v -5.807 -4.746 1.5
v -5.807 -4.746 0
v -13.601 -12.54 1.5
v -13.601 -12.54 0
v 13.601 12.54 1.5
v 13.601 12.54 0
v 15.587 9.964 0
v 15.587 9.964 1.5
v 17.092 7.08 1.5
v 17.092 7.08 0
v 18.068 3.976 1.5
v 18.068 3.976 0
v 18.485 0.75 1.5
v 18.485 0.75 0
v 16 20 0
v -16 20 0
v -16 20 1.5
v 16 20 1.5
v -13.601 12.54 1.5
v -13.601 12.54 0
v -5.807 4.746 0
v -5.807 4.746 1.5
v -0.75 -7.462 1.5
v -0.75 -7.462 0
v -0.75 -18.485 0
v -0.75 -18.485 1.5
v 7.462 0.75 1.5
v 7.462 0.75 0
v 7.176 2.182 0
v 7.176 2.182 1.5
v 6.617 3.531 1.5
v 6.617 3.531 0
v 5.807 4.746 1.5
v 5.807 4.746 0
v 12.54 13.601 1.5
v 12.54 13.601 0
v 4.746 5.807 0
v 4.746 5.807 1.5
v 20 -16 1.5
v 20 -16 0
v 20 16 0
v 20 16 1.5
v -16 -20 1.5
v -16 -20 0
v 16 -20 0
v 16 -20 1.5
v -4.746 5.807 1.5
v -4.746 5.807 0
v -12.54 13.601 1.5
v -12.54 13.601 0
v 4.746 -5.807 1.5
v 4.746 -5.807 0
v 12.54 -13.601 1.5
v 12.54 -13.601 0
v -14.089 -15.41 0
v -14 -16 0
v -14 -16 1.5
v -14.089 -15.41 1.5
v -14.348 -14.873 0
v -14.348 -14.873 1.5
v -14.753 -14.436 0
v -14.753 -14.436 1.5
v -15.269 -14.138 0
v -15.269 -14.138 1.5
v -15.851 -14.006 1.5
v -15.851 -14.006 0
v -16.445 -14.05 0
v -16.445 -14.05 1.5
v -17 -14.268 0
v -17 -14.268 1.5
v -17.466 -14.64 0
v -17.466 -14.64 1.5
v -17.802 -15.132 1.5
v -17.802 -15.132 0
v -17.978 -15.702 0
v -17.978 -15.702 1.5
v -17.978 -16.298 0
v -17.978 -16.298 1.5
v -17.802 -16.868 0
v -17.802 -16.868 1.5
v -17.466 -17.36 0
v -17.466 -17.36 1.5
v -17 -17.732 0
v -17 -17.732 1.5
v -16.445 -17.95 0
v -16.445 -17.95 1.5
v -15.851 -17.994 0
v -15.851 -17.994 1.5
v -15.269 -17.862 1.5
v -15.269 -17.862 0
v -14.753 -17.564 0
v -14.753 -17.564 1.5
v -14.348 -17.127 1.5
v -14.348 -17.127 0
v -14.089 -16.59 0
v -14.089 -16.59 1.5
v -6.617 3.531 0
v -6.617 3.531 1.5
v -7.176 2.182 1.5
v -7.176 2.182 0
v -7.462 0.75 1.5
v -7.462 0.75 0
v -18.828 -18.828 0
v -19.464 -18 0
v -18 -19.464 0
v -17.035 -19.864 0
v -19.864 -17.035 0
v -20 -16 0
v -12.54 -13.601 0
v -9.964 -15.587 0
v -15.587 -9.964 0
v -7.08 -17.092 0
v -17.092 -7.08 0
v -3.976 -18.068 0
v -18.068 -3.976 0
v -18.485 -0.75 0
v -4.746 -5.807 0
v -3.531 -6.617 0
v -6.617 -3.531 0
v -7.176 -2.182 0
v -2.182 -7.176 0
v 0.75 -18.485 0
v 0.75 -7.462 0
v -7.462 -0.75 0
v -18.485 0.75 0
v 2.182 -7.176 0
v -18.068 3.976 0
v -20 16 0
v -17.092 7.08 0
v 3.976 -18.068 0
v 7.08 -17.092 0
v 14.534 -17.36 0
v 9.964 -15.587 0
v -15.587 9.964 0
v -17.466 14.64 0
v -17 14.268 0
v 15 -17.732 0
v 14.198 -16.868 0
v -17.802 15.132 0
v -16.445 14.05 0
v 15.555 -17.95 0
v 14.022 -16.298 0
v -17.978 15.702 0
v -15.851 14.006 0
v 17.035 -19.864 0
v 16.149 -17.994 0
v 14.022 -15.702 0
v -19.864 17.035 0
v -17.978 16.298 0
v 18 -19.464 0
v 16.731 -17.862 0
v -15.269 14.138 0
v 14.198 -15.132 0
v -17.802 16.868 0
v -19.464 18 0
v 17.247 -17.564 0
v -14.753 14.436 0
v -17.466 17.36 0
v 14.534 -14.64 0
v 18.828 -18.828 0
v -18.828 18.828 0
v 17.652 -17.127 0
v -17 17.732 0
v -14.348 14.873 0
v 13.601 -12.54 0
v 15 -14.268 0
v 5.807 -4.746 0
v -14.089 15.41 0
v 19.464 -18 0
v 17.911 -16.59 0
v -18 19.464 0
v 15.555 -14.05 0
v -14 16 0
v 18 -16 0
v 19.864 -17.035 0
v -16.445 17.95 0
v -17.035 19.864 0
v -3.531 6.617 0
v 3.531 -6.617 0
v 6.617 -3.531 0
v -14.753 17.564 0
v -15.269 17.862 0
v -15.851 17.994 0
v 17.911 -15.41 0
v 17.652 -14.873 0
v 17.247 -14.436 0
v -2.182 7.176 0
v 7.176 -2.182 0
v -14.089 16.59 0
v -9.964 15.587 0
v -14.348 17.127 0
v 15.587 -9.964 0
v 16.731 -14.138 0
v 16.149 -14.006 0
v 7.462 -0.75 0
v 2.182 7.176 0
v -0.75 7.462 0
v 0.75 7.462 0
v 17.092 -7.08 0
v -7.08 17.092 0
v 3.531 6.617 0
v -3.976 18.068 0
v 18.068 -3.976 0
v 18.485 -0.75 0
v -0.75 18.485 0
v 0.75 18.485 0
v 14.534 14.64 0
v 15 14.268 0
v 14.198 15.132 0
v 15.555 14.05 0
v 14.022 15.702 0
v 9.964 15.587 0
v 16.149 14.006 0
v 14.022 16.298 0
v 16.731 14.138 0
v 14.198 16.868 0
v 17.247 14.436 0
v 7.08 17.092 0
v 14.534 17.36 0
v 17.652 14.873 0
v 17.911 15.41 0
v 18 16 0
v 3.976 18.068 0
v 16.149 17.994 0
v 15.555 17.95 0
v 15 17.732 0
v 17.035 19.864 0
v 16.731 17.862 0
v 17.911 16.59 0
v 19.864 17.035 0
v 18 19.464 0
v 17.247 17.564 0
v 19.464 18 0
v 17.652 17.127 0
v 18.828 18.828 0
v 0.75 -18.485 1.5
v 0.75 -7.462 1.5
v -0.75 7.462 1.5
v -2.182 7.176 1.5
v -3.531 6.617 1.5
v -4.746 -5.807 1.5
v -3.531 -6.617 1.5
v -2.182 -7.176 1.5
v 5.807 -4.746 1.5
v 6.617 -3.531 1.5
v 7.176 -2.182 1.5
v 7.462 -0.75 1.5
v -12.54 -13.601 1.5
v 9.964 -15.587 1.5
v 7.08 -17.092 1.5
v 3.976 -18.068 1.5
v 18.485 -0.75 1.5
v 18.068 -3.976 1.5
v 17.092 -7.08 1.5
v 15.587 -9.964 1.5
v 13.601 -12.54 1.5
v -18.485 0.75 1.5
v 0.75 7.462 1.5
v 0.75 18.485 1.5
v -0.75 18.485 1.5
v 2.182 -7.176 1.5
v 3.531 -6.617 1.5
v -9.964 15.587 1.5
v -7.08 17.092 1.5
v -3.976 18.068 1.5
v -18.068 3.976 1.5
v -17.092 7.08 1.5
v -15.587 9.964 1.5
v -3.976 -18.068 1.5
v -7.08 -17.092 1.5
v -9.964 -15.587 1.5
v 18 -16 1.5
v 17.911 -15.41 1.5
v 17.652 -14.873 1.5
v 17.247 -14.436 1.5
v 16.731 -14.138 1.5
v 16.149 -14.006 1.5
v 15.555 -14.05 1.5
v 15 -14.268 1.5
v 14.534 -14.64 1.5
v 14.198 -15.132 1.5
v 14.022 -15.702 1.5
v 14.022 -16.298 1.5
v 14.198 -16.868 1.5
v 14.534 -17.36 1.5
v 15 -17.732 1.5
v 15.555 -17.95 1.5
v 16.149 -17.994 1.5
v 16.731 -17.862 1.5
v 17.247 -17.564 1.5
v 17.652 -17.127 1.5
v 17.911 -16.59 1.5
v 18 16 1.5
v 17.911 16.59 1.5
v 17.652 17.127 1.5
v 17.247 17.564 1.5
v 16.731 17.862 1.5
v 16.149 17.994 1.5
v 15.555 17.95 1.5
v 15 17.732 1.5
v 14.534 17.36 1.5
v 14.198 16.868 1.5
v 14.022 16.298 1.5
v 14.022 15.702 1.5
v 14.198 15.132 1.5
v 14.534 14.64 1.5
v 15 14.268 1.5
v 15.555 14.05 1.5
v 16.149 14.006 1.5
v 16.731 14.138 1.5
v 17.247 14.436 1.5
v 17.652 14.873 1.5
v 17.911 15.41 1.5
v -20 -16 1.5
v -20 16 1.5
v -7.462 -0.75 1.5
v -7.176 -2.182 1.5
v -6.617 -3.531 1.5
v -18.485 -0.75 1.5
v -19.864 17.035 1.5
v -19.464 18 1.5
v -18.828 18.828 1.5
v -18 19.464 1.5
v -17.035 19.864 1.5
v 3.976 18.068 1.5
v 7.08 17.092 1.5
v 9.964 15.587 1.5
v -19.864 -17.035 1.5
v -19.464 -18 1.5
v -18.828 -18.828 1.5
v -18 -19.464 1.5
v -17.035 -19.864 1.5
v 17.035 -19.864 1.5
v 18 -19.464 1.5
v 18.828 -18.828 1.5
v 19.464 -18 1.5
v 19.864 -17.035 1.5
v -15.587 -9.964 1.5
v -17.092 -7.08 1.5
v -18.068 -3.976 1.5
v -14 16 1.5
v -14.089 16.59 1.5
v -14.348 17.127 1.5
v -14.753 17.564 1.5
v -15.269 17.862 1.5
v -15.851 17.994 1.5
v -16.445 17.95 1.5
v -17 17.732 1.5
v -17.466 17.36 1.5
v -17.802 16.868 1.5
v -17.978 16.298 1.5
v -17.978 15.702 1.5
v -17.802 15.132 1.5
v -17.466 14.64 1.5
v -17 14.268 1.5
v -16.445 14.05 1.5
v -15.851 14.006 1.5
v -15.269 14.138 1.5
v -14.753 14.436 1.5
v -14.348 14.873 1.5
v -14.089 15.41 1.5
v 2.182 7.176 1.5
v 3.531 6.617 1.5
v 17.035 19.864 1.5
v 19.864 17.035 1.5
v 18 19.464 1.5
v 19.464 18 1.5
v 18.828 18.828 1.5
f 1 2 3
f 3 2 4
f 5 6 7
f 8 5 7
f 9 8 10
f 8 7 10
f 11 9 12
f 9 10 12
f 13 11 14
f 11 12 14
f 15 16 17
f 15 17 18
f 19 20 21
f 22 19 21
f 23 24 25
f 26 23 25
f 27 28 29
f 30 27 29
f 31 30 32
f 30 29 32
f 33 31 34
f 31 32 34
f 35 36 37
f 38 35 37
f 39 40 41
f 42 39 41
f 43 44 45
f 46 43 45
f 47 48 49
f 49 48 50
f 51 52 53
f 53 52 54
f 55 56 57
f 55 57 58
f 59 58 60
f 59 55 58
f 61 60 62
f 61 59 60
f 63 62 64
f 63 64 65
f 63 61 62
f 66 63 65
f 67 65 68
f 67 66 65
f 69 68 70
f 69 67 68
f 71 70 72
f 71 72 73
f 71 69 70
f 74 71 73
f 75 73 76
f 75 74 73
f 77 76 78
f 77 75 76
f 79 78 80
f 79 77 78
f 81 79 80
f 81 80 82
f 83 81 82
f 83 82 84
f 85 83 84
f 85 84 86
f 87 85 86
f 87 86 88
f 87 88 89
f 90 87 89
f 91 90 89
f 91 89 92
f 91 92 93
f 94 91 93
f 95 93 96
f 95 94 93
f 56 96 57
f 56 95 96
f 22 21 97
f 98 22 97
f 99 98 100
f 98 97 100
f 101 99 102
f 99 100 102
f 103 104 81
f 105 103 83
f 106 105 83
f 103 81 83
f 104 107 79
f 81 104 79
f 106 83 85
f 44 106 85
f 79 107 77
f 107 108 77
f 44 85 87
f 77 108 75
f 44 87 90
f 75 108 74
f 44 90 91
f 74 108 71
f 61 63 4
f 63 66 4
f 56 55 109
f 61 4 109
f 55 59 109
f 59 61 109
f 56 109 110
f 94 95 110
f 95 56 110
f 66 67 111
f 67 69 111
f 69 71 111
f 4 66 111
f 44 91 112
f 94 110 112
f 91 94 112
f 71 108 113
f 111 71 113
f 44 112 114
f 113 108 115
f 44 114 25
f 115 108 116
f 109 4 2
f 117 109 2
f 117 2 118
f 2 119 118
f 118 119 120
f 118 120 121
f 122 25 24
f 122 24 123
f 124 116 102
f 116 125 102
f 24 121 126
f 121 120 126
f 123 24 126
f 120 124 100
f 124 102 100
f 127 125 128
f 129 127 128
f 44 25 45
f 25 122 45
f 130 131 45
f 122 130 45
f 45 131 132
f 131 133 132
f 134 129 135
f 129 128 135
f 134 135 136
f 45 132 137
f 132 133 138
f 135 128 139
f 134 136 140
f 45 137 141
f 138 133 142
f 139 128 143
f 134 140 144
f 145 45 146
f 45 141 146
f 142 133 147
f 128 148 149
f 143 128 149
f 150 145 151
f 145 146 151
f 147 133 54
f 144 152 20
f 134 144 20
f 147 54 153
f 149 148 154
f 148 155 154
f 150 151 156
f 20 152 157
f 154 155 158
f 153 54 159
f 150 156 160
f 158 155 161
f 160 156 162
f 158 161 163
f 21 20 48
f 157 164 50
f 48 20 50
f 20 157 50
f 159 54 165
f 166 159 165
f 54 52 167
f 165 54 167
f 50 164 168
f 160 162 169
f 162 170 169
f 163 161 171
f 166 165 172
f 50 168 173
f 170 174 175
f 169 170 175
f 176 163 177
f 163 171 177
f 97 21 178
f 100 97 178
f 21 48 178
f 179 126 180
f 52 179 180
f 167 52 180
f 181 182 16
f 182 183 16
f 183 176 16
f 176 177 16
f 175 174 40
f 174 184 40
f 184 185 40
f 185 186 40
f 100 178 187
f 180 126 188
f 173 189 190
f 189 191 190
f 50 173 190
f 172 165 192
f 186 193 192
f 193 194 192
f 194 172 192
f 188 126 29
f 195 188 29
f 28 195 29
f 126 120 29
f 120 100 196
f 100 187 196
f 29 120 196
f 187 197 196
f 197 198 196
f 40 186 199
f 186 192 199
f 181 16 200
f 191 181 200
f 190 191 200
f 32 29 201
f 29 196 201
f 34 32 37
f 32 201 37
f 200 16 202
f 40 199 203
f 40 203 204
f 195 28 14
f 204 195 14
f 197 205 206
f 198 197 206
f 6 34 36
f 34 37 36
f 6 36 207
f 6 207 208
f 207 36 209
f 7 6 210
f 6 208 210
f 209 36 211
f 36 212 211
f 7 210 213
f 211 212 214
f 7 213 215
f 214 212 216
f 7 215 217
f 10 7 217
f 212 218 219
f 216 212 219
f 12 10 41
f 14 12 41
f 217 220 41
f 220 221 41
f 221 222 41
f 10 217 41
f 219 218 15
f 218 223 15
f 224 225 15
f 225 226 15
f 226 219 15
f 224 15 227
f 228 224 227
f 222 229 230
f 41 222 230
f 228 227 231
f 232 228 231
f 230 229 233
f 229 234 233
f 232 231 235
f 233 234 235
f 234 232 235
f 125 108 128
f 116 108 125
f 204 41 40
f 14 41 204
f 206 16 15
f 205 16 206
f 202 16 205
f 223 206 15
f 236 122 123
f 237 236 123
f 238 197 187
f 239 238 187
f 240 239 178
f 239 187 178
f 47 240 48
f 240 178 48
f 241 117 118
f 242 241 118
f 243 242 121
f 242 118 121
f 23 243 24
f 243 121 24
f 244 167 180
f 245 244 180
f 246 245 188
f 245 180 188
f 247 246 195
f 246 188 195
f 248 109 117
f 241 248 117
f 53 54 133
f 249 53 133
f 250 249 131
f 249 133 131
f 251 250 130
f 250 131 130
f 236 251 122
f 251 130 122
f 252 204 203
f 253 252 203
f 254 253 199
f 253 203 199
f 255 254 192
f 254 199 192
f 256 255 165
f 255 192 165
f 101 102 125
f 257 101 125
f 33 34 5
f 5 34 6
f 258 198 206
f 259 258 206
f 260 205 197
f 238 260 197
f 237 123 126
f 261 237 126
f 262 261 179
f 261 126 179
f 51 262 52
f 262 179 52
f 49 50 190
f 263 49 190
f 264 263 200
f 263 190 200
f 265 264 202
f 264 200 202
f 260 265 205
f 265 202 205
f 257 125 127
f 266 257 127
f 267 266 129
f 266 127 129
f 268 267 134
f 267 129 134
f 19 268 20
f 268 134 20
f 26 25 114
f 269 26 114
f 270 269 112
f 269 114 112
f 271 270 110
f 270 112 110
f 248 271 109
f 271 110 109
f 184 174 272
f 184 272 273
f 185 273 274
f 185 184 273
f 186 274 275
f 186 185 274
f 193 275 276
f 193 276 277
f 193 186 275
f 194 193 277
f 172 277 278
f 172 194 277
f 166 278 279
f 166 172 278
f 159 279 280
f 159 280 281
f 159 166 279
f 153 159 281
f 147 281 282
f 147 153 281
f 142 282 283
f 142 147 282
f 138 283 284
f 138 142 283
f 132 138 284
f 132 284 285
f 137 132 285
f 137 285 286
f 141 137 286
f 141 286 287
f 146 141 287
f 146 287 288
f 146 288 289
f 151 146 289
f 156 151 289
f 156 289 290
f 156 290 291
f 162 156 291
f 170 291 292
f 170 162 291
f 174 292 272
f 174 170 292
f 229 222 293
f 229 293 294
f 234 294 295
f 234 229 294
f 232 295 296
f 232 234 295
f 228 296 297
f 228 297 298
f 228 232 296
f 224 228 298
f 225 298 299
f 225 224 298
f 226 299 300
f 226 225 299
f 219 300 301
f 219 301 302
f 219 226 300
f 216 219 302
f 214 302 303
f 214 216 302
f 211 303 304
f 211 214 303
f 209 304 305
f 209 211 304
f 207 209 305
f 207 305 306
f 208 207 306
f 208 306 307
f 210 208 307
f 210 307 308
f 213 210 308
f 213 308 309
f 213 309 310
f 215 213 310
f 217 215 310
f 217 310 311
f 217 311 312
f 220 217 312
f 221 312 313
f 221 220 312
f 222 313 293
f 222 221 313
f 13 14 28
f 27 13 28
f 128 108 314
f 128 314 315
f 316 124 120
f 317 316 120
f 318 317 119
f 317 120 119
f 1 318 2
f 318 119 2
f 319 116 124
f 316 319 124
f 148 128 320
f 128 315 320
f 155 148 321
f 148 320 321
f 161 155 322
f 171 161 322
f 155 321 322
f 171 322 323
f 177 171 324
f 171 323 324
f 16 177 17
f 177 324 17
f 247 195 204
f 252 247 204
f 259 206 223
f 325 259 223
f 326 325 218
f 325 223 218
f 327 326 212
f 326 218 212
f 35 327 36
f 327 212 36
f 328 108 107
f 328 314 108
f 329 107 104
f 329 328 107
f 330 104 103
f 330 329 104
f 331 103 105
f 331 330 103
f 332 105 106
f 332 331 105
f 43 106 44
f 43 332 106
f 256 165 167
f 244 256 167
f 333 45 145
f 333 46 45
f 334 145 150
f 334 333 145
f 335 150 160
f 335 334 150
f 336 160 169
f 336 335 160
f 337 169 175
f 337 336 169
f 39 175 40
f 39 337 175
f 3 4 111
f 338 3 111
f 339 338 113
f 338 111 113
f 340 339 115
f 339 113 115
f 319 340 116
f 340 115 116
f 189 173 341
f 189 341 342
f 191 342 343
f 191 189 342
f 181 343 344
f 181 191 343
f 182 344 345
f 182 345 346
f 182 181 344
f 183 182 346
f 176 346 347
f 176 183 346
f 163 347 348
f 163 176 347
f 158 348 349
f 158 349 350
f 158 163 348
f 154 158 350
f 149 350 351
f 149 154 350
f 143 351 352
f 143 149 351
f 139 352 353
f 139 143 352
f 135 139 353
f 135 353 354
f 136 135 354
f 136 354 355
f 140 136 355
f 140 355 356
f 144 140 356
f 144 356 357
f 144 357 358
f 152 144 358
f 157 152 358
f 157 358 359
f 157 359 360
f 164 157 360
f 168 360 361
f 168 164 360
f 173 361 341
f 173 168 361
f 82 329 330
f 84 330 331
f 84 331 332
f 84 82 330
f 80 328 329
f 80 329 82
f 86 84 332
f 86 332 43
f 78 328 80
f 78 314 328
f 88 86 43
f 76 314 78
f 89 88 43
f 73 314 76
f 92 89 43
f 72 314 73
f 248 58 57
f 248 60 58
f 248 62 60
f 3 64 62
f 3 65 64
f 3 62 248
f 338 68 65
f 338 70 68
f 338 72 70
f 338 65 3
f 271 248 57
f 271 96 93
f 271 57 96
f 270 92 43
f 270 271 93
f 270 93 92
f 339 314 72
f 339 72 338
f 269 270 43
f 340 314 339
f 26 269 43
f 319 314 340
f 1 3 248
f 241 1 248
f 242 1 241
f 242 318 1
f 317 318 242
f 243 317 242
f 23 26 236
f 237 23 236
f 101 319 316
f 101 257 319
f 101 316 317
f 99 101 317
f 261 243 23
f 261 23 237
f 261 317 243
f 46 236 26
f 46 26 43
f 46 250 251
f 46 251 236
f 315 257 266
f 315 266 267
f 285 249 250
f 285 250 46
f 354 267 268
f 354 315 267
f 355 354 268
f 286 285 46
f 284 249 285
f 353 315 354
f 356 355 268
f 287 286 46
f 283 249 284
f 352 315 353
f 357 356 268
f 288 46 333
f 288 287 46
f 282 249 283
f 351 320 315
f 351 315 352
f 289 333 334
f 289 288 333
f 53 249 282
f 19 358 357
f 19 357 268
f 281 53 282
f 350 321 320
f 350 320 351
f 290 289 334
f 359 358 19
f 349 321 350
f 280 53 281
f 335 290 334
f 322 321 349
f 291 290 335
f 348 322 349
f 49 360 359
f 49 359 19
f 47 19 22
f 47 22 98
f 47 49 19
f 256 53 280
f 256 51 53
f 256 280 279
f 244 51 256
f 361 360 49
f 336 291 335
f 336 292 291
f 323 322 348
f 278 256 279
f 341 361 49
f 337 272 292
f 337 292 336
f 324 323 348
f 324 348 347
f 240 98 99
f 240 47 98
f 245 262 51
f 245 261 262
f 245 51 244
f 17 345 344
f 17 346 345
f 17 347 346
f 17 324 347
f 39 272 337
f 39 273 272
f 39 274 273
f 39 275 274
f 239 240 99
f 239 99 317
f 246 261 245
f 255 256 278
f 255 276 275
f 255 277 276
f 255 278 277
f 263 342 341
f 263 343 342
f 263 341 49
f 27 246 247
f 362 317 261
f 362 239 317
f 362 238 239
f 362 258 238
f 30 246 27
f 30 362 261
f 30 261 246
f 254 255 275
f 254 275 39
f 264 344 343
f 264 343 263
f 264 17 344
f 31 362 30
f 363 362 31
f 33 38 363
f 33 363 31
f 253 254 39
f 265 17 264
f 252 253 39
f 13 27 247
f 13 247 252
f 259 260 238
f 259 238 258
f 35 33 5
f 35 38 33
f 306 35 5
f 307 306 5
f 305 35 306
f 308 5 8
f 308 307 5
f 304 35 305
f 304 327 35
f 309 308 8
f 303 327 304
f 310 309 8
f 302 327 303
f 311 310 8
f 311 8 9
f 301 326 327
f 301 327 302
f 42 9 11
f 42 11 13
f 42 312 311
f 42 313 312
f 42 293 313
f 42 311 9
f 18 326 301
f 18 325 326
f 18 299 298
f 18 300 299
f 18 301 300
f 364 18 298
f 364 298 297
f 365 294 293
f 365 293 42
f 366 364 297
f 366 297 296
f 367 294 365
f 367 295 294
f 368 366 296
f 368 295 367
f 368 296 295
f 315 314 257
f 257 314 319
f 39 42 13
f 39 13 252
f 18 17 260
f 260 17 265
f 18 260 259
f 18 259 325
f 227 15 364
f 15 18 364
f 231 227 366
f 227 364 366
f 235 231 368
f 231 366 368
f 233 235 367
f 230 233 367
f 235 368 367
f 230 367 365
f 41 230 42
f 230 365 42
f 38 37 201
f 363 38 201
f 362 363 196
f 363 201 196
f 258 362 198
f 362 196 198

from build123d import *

# Parameters (mm, degrees)
F0_W     = 40
F0_H     = 40
F0_R     = 2
F1_DEPTH = 1.5
F2_W     = 40
F2_H     = 40
F3_DEPTH = 25
F4_R     = 4


with BuildPart() as f1:
    # F0 (on Top) → F1 (new body)
    with BuildSketch(Plane.XY):
        Rectangle(F0_W, F0_H)
        with Locations((-16, -16)):
            Circle(F0_R, mode=Mode.SUBTRACT)
        with Locations((16, -16)):
            Circle(F0_R, mode=Mode.SUBTRACT)
        with Locations((-16, 16)):
            Circle(F0_R, mode=Mode.SUBTRACT)
        with Locations((16, 16)):
            Circle(F0_R, mode=Mode.SUBTRACT)
    extrude(amount=F1_DEPTH)

    # F2 (on Top) → F3 (intersect)
    with BuildSketch(Plane.XY):
        Rectangle(F2_W, F2_H)
        with BuildLine():
            Line((-12.540391, -13.601051), (-4.746388, -5.807048))
            ThreePointArc((-4.746388, -5.807048), (-2.870126, -6.929096), (-0.75, -7.462406))
            Line((-0.75, -7.462406), (-0.75, -18.484791))
            ThreePointArc((-0.75, -18.484791), (-7.079643, -17.091771), (-12.540391, -13.601051))
        make_face(mode=Mode.SUBTRACT)
        with BuildLine():
            Line((-18.484791, -0.75), (-7.462406, -0.75))
            ThreePointArc((-7.462406, -0.75), (-6.929096, -2.870126), (-5.807048, -4.746388))
            Line((-5.807048, -4.746388), (-13.601051, -12.540391))
            ThreePointArc((-13.601051, -12.540391), (-17.091771, -7.079643), (-18.484791, -0.75))
        make_face(mode=Mode.SUBTRACT)
        with BuildLine():
            Line((0.75, -18.484791), (0.75, -7.462406))
            ThreePointArc((0.75, -7.462406), (2.870126, -6.929096), (4.746388, -5.807048))
            Line((4.746388, -5.807048), (12.540391, -13.601051))
            ThreePointArc((12.540391, -13.601051), (7.079643, -17.091771), (0.75, -18.484791))
        make_face(mode=Mode.SUBTRACT)
        with BuildLine():
            Line((13.601051, -12.540391), (5.807048, -4.746388))
            ThreePointArc((5.807048, -4.746388), (6.929096, -2.870126), (7.462406, -0.75))
            Line((7.462406, -0.75), (18.484791, -0.75))
            ThreePointArc((18.484791, -0.75), (17.091771, -7.079643), (13.601051, -12.540391))
        make_face(mode=Mode.SUBTRACT)
        with BuildLine():
            ThreePointArc((-18.484791, 0.75), (-17.091771, 7.079643), (-13.601051, 12.540391))
            Line((-13.601051, 12.540391), (-5.807048, 4.746388))
            ThreePointArc((-5.807048, 4.746388), (-6.929096, 2.870126), (-7.462406, 0.75))
            Line((-7.462406, 0.75), (-18.484791, 0.75))
        make_face(mode=Mode.SUBTRACT)
        with BuildLine():
            ThreePointArc((-12.540391, 13.601051), (-7.079643, 17.091771), (-0.75, 18.484791))
            Line((-0.75, 18.484791), (-0.75, 7.462406))
            ThreePointArc((-0.75, 7.462406), (-2.870126, 6.929096), (-4.746388, 5.807048))
            Line((-4.746388, 5.807048), (-12.540391, 13.601051))
        make_face(mode=Mode.SUBTRACT)
        with BuildLine():
            ThreePointArc((13.601051, 12.540391), (17.091771, 7.079643), (18.484791, 0.75))
            Line((18.484791, 0.75), (7.462406, 0.75))
            ThreePointArc((7.462406, 0.75), (6.929096, 2.870126), (5.807048, 4.746388))
            Line((5.807048, 4.746388), (13.601051, 12.540391))
        make_face(mode=Mode.SUBTRACT)
        with BuildLine():
            Line((0.75, 7.462406), (0.75, 18.484791))
            ThreePointArc((0.75, 18.484791), (7.079643, 17.091771), (12.540391, 13.601051))
            Line((12.540391, 13.601051), (4.746388, 5.807048))
            ThreePointArc((4.746388, 5.807048), (2.870126, 6.929096), (0.75, 7.462406))
        make_face(mode=Mode.SUBTRACT)
    extrude(amount=F3_DEPTH, mode=Mode.INTERSECT)

    # F4
    f4_edges = [f1.edges().sort_by_distance(p)[0] for p in [
        (-20, 20, 0.75),
        (20, 20, 0.75),
        (-20, -20, 0.75),
        (20, -20, 0.75),
    ]]
    fillet(f4_edges, radius=F4_R)


solid = f1.part
